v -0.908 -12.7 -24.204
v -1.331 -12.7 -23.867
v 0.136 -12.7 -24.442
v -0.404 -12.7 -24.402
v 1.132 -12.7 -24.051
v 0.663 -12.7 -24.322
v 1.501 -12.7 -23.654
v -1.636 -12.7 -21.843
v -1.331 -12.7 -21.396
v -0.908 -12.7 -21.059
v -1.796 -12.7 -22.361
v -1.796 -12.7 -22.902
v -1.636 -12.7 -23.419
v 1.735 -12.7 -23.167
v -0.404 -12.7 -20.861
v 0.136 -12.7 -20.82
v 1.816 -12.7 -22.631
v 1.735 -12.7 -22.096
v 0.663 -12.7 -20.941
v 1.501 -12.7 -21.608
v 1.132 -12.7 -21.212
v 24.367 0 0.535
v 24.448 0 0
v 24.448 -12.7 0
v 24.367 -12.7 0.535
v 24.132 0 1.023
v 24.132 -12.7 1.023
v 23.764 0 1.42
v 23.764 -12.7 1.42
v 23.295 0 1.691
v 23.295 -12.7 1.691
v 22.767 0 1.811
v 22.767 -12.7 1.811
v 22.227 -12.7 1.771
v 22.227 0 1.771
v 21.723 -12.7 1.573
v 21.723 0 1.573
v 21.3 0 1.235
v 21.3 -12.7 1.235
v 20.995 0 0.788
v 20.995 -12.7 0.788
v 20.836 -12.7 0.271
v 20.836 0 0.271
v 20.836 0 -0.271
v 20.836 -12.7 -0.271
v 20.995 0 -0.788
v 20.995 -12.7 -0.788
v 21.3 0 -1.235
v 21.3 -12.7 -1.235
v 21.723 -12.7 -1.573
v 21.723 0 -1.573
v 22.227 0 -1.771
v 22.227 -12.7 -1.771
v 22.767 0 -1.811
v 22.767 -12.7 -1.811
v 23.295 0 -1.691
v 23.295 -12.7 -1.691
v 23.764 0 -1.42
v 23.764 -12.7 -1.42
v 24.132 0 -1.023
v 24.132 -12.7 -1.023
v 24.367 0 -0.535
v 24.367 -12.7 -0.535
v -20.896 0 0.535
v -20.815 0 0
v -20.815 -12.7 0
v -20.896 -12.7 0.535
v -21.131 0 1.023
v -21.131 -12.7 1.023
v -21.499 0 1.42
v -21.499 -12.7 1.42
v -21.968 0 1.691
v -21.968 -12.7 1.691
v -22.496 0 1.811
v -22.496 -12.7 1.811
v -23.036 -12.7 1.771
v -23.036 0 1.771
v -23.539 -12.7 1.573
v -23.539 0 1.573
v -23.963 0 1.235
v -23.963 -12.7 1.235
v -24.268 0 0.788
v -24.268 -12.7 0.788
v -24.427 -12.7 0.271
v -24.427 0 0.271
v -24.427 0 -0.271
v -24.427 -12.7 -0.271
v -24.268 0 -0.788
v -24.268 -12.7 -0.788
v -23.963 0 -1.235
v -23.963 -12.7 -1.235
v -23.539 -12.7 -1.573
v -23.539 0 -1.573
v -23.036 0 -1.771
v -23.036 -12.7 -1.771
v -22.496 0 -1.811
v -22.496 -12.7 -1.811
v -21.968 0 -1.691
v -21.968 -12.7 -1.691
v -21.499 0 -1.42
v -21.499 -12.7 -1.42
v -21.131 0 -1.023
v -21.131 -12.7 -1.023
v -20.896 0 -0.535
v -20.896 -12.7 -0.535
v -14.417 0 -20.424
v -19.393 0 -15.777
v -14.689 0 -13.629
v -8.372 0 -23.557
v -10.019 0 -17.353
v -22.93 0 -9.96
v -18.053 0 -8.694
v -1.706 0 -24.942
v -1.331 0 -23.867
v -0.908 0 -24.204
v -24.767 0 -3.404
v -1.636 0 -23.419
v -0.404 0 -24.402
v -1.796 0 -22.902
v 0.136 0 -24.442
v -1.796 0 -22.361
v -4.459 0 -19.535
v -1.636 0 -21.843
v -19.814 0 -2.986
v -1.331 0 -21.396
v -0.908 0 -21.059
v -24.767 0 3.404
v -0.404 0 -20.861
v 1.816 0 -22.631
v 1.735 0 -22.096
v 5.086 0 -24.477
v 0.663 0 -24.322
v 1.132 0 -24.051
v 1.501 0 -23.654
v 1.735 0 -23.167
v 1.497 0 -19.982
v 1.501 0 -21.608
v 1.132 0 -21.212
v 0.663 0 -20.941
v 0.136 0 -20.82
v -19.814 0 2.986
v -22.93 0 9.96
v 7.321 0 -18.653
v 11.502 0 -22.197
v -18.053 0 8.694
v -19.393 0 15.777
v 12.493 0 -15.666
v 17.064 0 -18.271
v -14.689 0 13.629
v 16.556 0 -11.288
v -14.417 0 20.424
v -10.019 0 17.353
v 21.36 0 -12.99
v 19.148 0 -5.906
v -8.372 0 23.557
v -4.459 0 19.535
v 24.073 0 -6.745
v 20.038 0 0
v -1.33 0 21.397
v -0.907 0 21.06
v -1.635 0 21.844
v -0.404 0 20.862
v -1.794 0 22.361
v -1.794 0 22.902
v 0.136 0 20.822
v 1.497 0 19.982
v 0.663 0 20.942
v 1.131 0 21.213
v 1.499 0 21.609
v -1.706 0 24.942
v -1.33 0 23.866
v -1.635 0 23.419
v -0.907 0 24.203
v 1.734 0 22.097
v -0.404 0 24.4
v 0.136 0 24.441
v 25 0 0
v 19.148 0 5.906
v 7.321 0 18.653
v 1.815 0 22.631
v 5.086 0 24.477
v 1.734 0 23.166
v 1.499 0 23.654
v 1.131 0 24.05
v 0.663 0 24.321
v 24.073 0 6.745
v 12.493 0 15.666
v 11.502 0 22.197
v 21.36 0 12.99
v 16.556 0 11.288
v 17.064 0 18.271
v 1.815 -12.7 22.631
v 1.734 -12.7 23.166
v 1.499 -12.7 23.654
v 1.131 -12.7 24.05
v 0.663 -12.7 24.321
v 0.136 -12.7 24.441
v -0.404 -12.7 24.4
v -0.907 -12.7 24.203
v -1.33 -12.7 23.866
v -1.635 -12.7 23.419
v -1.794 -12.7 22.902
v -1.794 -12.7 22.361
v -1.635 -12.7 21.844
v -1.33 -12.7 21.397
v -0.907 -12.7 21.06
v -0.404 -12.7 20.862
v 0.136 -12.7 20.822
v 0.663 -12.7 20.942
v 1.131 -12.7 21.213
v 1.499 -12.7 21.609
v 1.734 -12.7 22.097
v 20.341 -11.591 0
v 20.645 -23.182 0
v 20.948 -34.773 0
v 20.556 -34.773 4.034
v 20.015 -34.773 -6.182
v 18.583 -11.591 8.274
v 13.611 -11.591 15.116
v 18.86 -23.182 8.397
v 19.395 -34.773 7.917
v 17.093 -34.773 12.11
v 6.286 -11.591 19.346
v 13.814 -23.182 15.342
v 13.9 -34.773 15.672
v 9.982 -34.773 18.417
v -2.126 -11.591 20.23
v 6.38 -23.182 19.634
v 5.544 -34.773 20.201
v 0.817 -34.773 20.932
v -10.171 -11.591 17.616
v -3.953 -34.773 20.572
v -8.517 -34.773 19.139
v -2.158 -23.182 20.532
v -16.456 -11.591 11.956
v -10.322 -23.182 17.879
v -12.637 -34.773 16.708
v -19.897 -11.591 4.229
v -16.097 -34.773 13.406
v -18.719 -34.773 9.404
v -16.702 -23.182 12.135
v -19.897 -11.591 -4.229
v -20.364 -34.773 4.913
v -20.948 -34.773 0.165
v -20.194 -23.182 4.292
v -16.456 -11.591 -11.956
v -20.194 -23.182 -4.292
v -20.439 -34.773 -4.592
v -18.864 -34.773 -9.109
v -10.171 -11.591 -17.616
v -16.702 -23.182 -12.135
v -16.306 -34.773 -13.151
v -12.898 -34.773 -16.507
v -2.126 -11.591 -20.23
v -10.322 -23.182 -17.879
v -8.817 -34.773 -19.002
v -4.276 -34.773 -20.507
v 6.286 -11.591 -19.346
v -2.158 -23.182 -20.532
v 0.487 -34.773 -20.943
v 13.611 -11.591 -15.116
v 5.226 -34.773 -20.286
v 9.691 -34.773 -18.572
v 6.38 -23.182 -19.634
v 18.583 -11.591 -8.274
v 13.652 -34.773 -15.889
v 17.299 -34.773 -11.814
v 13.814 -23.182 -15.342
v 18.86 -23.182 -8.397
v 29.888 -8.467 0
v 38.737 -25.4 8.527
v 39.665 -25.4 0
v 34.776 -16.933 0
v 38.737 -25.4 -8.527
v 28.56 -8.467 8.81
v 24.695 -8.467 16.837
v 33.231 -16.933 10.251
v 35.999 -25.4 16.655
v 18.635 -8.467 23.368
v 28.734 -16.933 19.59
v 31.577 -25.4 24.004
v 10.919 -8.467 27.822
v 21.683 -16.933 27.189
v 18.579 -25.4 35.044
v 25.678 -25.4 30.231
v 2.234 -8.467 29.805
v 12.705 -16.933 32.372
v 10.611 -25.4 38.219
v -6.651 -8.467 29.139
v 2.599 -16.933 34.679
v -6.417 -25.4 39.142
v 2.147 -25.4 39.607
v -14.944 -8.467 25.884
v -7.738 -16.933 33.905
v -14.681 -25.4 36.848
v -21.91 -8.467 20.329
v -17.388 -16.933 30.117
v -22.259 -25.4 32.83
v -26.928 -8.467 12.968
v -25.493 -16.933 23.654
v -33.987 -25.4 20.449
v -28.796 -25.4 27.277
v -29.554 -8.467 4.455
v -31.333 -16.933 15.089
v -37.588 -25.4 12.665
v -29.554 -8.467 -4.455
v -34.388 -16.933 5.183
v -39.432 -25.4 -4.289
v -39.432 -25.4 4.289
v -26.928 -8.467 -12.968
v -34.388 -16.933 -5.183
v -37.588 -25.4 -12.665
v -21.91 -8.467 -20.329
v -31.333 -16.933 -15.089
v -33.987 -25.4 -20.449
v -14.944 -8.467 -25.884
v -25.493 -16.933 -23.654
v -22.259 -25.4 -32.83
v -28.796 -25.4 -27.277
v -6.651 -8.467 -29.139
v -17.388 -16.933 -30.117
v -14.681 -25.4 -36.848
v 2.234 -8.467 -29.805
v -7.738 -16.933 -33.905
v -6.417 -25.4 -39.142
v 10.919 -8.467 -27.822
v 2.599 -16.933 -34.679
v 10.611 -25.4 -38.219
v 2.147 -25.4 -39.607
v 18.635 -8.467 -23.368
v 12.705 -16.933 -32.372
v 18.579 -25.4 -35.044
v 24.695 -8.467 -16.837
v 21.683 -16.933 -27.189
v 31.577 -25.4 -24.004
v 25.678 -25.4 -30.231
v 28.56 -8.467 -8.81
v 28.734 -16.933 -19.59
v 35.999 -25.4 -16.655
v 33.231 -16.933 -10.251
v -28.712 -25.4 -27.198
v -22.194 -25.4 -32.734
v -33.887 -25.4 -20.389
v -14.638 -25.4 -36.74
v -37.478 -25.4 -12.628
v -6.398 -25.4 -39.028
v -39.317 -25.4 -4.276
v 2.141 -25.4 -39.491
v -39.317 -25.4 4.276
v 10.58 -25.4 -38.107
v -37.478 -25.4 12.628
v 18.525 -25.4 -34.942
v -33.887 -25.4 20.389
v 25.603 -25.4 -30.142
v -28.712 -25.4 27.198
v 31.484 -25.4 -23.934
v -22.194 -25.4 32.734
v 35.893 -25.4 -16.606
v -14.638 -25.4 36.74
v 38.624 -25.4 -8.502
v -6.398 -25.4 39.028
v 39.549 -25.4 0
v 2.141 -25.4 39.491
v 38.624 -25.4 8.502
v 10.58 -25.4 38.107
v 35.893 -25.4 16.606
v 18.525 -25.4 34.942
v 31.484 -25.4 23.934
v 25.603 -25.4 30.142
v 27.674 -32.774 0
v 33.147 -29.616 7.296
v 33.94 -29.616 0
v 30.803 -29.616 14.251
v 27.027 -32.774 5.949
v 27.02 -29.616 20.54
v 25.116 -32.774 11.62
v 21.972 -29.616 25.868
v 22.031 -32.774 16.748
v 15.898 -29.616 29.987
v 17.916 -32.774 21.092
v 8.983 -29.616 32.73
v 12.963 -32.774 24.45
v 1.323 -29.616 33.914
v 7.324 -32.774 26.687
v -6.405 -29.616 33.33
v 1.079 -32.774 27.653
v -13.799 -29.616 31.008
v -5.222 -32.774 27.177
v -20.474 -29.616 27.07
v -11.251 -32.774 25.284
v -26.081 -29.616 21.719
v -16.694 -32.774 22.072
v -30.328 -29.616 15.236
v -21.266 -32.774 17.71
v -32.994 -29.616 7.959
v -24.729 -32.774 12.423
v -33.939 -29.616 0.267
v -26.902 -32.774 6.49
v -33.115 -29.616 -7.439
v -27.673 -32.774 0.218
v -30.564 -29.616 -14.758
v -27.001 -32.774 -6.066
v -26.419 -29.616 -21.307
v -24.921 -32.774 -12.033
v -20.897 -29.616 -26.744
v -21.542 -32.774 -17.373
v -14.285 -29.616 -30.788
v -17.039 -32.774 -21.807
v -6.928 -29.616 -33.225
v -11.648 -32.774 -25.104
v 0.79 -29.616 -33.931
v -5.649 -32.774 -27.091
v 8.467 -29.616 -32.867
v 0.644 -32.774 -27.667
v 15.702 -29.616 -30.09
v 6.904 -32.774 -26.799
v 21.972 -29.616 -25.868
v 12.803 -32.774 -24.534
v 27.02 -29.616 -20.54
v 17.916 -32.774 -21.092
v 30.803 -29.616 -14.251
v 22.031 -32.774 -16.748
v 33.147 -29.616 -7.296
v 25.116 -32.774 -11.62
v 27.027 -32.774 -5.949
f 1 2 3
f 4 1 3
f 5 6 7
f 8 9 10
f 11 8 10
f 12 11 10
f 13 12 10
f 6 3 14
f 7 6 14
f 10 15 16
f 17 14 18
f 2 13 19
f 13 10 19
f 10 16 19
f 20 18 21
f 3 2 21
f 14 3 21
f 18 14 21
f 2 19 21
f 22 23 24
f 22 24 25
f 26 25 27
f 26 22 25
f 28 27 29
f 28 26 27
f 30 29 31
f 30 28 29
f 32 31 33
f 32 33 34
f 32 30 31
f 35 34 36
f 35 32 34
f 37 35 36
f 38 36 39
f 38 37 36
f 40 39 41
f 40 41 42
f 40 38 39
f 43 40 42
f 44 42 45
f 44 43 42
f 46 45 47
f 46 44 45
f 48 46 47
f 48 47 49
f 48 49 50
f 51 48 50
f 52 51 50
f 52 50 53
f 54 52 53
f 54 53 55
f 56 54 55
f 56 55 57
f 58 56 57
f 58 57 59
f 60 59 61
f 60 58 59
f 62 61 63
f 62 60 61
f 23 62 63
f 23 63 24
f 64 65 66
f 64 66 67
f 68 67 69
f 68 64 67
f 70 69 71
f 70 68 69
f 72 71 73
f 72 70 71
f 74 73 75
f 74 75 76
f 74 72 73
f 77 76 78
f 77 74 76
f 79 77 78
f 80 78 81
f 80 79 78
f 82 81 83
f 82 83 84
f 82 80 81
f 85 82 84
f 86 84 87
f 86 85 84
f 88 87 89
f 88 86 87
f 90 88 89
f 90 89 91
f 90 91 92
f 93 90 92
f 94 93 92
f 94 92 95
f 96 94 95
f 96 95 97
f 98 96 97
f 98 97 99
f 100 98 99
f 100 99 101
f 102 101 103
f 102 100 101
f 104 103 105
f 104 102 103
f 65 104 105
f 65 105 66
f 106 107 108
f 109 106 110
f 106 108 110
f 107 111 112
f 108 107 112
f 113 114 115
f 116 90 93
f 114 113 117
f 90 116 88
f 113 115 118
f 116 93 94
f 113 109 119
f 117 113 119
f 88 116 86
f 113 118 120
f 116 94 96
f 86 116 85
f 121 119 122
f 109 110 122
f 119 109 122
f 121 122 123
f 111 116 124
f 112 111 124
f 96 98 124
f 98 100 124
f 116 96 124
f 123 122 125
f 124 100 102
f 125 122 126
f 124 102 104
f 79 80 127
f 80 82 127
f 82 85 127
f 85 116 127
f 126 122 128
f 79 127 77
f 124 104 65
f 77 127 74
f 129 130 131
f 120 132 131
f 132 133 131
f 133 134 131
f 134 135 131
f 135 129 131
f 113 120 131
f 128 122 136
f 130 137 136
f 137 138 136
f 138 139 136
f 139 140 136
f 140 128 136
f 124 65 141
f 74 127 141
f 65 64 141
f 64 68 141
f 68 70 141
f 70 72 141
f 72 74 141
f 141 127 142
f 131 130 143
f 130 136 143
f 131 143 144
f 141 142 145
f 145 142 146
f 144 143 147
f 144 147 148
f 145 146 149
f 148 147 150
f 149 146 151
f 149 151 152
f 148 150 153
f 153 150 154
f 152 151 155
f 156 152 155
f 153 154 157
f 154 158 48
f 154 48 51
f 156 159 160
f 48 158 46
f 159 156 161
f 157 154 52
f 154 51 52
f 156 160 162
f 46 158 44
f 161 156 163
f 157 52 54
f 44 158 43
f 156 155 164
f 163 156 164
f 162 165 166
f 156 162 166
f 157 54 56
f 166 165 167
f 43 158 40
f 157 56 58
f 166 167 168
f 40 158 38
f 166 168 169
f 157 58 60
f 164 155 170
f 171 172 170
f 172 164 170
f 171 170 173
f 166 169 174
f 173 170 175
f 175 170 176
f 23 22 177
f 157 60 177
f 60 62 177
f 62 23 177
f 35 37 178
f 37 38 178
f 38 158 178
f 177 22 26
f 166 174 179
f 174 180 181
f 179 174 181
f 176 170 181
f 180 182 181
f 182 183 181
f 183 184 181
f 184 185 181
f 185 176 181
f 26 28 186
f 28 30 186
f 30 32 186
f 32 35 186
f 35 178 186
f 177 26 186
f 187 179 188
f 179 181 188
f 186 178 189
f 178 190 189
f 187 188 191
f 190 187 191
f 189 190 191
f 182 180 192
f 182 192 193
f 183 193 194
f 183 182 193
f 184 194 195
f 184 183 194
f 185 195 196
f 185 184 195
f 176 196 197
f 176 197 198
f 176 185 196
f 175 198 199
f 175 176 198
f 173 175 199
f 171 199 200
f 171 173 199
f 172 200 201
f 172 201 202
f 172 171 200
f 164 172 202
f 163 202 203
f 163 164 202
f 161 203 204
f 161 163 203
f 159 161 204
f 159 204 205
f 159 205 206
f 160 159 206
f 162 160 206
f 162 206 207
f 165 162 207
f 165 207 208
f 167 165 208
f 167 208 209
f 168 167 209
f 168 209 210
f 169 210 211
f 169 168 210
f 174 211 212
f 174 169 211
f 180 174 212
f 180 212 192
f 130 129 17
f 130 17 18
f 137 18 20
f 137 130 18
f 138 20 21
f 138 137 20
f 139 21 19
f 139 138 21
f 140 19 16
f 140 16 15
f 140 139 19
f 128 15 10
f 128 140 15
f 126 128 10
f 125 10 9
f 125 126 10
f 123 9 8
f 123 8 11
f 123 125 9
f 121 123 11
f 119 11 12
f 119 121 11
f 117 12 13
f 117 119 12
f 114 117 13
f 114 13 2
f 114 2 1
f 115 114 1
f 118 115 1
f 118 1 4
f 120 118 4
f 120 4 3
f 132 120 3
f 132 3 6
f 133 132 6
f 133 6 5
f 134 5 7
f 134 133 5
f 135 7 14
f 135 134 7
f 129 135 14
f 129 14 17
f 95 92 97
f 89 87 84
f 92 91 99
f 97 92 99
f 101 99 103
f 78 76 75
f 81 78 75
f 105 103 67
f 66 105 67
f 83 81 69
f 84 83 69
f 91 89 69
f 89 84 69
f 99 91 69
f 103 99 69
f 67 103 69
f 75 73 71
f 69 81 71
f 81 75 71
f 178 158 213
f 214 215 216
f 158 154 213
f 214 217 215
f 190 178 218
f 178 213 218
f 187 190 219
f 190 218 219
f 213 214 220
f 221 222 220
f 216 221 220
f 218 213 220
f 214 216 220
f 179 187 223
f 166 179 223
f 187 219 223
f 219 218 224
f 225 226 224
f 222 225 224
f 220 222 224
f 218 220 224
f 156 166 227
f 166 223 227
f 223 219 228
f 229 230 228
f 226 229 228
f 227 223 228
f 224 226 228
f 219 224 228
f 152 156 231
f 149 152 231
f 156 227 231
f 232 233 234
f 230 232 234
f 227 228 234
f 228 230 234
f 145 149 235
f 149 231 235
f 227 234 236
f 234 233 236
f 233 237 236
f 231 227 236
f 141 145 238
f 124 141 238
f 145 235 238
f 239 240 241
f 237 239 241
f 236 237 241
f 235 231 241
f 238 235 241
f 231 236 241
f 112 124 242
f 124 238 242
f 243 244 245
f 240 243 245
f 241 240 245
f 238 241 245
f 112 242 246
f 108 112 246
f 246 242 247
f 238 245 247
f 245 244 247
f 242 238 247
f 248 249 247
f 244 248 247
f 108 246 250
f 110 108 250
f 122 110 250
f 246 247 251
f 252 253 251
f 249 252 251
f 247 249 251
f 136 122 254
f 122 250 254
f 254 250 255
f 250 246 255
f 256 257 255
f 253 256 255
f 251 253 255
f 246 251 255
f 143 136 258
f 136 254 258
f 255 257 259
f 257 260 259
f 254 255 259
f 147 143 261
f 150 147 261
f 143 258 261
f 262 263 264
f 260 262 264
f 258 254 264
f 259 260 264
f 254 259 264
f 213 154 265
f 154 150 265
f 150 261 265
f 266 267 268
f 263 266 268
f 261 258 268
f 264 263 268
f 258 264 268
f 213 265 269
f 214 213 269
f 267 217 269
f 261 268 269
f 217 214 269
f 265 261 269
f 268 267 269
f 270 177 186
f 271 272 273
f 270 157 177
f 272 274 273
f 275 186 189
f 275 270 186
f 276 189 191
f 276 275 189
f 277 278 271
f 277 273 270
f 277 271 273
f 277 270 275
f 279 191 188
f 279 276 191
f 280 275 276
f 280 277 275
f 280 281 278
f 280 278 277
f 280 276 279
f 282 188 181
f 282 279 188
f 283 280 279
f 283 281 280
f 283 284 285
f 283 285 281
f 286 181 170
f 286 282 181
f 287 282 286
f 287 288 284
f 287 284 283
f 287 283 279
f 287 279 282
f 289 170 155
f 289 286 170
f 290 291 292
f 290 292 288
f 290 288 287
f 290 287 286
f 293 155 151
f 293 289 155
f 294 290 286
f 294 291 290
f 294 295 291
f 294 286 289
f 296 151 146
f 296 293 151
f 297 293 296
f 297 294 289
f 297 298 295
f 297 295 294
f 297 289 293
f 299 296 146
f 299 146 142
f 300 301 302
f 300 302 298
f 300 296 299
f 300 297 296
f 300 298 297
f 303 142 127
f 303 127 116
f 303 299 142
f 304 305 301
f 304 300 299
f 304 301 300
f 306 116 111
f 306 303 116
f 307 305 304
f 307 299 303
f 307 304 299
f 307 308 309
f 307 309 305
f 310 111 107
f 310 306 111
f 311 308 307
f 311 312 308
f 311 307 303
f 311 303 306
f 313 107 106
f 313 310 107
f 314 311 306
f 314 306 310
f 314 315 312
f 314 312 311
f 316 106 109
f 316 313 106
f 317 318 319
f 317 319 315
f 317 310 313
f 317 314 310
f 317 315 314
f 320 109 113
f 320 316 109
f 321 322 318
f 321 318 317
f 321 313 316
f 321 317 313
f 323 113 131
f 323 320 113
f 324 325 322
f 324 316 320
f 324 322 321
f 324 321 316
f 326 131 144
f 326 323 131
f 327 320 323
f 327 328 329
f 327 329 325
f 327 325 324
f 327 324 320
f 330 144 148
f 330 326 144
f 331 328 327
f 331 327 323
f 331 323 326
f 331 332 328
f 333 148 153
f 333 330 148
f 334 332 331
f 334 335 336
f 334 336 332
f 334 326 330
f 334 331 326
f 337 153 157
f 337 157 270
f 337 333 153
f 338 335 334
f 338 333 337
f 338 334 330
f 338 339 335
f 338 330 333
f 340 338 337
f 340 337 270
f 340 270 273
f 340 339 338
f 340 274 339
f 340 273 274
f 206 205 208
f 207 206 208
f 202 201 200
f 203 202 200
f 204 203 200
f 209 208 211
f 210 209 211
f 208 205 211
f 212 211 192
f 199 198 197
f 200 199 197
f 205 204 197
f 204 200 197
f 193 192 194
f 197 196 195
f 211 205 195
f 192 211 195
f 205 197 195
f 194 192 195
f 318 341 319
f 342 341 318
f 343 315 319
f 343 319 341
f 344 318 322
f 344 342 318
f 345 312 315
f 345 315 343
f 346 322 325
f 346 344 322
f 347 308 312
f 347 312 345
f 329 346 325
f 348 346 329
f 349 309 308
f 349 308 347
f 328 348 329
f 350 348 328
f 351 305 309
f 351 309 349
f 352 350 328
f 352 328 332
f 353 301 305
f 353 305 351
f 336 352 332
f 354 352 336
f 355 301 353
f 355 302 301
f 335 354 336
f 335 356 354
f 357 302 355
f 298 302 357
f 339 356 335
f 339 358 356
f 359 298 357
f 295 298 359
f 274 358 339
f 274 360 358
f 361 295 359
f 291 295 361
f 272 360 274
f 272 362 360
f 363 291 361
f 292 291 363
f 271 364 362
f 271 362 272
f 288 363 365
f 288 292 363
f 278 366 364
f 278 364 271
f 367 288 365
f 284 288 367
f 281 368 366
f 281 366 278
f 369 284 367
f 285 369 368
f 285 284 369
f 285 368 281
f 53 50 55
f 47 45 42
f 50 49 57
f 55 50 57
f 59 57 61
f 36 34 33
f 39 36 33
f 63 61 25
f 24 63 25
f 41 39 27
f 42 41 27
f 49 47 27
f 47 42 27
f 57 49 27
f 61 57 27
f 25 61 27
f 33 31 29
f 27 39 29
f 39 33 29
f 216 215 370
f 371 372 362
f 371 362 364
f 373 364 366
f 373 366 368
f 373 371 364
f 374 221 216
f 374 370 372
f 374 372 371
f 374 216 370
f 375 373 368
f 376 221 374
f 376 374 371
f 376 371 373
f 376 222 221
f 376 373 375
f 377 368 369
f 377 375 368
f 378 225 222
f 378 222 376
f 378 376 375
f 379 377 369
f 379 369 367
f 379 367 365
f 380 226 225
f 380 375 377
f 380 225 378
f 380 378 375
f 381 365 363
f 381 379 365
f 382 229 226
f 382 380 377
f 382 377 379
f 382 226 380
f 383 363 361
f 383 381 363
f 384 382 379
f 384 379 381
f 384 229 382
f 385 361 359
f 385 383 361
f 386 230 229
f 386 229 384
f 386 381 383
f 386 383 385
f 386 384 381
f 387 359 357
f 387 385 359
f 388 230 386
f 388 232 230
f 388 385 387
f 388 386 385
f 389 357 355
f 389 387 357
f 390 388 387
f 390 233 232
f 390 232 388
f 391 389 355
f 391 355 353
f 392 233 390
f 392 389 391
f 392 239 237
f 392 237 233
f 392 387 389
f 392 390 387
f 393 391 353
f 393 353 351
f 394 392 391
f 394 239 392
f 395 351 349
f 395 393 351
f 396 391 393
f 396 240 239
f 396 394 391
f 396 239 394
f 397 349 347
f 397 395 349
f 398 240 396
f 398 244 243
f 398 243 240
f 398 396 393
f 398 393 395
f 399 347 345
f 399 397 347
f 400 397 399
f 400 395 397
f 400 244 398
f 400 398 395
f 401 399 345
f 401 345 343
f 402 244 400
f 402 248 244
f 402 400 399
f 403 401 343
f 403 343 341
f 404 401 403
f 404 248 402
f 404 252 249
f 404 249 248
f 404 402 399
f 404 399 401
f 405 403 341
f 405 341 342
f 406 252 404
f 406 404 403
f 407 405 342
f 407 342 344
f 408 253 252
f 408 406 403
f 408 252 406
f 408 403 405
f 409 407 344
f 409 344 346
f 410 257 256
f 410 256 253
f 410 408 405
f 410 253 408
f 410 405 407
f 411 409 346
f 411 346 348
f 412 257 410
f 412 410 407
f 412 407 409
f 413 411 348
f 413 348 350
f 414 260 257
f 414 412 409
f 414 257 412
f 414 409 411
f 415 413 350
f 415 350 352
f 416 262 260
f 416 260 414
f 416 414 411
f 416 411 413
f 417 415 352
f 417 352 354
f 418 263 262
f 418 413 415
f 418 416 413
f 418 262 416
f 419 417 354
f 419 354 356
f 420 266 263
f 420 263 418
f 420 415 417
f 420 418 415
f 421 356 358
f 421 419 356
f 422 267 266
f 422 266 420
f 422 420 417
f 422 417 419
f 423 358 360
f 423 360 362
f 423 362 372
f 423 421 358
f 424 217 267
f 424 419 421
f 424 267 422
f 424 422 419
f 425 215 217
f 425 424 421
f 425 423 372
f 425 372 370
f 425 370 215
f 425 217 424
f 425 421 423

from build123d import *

# Parameters (mm, degrees)
F0_R           = 25
F1_DEPTH       = 25.4
F1_TAPER       = -30
F3_R           = 39.5485289591
F4_DEPTH       = 10.16
F6_R           = 20.0377303014
F7_DEPTH       = 35.5610001
F7_TAPER       = -1.5
F8_R           = 1.8145667082
F9_DEPTH       = 12.7
F9_DEPTH_BACK  = 25.4
F8_R_2         = 1.8161
F10_DEPTH      = 12.7
F10_DEPTH_BACK = 12.7
F11_DEPTH      = 12.7


# Not quite as in the source:
# - a fillet or chamfer that OpenCascade refuses, or shapes differently, is made with other operations: its cross-section is extruded or revolved along the edge and cut away or added


with BuildPart() as f1:
    # F0 (on Front) → F1 (new body)
    with BuildSketch(Plane.XZ):
        Circle(F0_R)
    extrude(amount=F1_DEPTH, taper=F1_TAPER)

    # F3 (on offset) → F4 (join)
    with BuildSketch(Plane.XZ.offset(25.4)):
        Circle(F3_R)
    extrude(amount=F4_DEPTH)

    # F5: fillet of radius 39.497 on 1 edges, made by hand

    # F5_s1 → F5_t2 (revolve, cut)
    with BuildSketch(Plane.XY):
        with BuildLine():
            ThreePointArc((39.5485289591, -25.4), (27.2681504962, -32.9326114571), (13.1032375067, -35.56))
            Line((13.1032375067, -35.56), (13.1032375067, -36.34994))
            Line((13.1032375067, -36.34994), (39.5485289591, -36.34994))
            Line((39.5485289591, -36.34994), (40.3384689591, -35.56))
            ThreePointArc((40.3384689591, -35.56), (40.3384689591, -30.48), (40.0774347881, -25.98674))
            Line((40.0774347881, -25.98674), (39.5485289591, -25.4))
        make_face()
    revolve(axis=Axis((0, -35.56, 0), (0, -1, 0)), mode=Mode.SUBTRACT)

    # F6 (on Front) → F7 (cut, through all)
    with BuildSketch(Plane.XZ):
        Circle(F6_R)
    extrude(amount=F7_DEPTH, taper=F7_TAPER, mode=Mode.SUBTRACT)

    # F8 (on Front) → F9 (cut, two sides)
    with BuildSketch(Plane.XZ) as f9_sk:
        with Locations((0, 22.6314)):
            Circle(F8_R)
    extrude(amount=F9_DEPTH, mode=Mode.SUBTRACT)
    extrude(f9_sk.sketch, amount=-F9_DEPTH_BACK, mode=Mode.SUBTRACT)

    # F8 (on Front) → F10 (cut, two sides)
    with BuildSketch(Plane.XZ) as f10_sk:
        with Locations((22.6314, 0)):
            Circle(F8_R_2)
    extrude(amount=-F10_DEPTH, mode=Mode.SUBTRACT)
    extrude(f10_sk.sketch, amount=F10_DEPTH_BACK, mode=Mode.SUBTRACT)

    # F8 (on Front) → F11 (cut)
    with BuildSketch(Plane.XZ):
        with Locations((0, 22.6314)):
            Circle(F8_R)
        with Locations((22.6314, 0)):
            Circle(F8_R_2)
        with Locations((0, -22.6314)):
            Circle(F8_R_2)
        with Locations((-22.6314, 0)):
            Circle(F8_R_2)
    extrude(amount=F11_DEPTH, mode=Mode.SUBTRACT)


solid = f1.part
